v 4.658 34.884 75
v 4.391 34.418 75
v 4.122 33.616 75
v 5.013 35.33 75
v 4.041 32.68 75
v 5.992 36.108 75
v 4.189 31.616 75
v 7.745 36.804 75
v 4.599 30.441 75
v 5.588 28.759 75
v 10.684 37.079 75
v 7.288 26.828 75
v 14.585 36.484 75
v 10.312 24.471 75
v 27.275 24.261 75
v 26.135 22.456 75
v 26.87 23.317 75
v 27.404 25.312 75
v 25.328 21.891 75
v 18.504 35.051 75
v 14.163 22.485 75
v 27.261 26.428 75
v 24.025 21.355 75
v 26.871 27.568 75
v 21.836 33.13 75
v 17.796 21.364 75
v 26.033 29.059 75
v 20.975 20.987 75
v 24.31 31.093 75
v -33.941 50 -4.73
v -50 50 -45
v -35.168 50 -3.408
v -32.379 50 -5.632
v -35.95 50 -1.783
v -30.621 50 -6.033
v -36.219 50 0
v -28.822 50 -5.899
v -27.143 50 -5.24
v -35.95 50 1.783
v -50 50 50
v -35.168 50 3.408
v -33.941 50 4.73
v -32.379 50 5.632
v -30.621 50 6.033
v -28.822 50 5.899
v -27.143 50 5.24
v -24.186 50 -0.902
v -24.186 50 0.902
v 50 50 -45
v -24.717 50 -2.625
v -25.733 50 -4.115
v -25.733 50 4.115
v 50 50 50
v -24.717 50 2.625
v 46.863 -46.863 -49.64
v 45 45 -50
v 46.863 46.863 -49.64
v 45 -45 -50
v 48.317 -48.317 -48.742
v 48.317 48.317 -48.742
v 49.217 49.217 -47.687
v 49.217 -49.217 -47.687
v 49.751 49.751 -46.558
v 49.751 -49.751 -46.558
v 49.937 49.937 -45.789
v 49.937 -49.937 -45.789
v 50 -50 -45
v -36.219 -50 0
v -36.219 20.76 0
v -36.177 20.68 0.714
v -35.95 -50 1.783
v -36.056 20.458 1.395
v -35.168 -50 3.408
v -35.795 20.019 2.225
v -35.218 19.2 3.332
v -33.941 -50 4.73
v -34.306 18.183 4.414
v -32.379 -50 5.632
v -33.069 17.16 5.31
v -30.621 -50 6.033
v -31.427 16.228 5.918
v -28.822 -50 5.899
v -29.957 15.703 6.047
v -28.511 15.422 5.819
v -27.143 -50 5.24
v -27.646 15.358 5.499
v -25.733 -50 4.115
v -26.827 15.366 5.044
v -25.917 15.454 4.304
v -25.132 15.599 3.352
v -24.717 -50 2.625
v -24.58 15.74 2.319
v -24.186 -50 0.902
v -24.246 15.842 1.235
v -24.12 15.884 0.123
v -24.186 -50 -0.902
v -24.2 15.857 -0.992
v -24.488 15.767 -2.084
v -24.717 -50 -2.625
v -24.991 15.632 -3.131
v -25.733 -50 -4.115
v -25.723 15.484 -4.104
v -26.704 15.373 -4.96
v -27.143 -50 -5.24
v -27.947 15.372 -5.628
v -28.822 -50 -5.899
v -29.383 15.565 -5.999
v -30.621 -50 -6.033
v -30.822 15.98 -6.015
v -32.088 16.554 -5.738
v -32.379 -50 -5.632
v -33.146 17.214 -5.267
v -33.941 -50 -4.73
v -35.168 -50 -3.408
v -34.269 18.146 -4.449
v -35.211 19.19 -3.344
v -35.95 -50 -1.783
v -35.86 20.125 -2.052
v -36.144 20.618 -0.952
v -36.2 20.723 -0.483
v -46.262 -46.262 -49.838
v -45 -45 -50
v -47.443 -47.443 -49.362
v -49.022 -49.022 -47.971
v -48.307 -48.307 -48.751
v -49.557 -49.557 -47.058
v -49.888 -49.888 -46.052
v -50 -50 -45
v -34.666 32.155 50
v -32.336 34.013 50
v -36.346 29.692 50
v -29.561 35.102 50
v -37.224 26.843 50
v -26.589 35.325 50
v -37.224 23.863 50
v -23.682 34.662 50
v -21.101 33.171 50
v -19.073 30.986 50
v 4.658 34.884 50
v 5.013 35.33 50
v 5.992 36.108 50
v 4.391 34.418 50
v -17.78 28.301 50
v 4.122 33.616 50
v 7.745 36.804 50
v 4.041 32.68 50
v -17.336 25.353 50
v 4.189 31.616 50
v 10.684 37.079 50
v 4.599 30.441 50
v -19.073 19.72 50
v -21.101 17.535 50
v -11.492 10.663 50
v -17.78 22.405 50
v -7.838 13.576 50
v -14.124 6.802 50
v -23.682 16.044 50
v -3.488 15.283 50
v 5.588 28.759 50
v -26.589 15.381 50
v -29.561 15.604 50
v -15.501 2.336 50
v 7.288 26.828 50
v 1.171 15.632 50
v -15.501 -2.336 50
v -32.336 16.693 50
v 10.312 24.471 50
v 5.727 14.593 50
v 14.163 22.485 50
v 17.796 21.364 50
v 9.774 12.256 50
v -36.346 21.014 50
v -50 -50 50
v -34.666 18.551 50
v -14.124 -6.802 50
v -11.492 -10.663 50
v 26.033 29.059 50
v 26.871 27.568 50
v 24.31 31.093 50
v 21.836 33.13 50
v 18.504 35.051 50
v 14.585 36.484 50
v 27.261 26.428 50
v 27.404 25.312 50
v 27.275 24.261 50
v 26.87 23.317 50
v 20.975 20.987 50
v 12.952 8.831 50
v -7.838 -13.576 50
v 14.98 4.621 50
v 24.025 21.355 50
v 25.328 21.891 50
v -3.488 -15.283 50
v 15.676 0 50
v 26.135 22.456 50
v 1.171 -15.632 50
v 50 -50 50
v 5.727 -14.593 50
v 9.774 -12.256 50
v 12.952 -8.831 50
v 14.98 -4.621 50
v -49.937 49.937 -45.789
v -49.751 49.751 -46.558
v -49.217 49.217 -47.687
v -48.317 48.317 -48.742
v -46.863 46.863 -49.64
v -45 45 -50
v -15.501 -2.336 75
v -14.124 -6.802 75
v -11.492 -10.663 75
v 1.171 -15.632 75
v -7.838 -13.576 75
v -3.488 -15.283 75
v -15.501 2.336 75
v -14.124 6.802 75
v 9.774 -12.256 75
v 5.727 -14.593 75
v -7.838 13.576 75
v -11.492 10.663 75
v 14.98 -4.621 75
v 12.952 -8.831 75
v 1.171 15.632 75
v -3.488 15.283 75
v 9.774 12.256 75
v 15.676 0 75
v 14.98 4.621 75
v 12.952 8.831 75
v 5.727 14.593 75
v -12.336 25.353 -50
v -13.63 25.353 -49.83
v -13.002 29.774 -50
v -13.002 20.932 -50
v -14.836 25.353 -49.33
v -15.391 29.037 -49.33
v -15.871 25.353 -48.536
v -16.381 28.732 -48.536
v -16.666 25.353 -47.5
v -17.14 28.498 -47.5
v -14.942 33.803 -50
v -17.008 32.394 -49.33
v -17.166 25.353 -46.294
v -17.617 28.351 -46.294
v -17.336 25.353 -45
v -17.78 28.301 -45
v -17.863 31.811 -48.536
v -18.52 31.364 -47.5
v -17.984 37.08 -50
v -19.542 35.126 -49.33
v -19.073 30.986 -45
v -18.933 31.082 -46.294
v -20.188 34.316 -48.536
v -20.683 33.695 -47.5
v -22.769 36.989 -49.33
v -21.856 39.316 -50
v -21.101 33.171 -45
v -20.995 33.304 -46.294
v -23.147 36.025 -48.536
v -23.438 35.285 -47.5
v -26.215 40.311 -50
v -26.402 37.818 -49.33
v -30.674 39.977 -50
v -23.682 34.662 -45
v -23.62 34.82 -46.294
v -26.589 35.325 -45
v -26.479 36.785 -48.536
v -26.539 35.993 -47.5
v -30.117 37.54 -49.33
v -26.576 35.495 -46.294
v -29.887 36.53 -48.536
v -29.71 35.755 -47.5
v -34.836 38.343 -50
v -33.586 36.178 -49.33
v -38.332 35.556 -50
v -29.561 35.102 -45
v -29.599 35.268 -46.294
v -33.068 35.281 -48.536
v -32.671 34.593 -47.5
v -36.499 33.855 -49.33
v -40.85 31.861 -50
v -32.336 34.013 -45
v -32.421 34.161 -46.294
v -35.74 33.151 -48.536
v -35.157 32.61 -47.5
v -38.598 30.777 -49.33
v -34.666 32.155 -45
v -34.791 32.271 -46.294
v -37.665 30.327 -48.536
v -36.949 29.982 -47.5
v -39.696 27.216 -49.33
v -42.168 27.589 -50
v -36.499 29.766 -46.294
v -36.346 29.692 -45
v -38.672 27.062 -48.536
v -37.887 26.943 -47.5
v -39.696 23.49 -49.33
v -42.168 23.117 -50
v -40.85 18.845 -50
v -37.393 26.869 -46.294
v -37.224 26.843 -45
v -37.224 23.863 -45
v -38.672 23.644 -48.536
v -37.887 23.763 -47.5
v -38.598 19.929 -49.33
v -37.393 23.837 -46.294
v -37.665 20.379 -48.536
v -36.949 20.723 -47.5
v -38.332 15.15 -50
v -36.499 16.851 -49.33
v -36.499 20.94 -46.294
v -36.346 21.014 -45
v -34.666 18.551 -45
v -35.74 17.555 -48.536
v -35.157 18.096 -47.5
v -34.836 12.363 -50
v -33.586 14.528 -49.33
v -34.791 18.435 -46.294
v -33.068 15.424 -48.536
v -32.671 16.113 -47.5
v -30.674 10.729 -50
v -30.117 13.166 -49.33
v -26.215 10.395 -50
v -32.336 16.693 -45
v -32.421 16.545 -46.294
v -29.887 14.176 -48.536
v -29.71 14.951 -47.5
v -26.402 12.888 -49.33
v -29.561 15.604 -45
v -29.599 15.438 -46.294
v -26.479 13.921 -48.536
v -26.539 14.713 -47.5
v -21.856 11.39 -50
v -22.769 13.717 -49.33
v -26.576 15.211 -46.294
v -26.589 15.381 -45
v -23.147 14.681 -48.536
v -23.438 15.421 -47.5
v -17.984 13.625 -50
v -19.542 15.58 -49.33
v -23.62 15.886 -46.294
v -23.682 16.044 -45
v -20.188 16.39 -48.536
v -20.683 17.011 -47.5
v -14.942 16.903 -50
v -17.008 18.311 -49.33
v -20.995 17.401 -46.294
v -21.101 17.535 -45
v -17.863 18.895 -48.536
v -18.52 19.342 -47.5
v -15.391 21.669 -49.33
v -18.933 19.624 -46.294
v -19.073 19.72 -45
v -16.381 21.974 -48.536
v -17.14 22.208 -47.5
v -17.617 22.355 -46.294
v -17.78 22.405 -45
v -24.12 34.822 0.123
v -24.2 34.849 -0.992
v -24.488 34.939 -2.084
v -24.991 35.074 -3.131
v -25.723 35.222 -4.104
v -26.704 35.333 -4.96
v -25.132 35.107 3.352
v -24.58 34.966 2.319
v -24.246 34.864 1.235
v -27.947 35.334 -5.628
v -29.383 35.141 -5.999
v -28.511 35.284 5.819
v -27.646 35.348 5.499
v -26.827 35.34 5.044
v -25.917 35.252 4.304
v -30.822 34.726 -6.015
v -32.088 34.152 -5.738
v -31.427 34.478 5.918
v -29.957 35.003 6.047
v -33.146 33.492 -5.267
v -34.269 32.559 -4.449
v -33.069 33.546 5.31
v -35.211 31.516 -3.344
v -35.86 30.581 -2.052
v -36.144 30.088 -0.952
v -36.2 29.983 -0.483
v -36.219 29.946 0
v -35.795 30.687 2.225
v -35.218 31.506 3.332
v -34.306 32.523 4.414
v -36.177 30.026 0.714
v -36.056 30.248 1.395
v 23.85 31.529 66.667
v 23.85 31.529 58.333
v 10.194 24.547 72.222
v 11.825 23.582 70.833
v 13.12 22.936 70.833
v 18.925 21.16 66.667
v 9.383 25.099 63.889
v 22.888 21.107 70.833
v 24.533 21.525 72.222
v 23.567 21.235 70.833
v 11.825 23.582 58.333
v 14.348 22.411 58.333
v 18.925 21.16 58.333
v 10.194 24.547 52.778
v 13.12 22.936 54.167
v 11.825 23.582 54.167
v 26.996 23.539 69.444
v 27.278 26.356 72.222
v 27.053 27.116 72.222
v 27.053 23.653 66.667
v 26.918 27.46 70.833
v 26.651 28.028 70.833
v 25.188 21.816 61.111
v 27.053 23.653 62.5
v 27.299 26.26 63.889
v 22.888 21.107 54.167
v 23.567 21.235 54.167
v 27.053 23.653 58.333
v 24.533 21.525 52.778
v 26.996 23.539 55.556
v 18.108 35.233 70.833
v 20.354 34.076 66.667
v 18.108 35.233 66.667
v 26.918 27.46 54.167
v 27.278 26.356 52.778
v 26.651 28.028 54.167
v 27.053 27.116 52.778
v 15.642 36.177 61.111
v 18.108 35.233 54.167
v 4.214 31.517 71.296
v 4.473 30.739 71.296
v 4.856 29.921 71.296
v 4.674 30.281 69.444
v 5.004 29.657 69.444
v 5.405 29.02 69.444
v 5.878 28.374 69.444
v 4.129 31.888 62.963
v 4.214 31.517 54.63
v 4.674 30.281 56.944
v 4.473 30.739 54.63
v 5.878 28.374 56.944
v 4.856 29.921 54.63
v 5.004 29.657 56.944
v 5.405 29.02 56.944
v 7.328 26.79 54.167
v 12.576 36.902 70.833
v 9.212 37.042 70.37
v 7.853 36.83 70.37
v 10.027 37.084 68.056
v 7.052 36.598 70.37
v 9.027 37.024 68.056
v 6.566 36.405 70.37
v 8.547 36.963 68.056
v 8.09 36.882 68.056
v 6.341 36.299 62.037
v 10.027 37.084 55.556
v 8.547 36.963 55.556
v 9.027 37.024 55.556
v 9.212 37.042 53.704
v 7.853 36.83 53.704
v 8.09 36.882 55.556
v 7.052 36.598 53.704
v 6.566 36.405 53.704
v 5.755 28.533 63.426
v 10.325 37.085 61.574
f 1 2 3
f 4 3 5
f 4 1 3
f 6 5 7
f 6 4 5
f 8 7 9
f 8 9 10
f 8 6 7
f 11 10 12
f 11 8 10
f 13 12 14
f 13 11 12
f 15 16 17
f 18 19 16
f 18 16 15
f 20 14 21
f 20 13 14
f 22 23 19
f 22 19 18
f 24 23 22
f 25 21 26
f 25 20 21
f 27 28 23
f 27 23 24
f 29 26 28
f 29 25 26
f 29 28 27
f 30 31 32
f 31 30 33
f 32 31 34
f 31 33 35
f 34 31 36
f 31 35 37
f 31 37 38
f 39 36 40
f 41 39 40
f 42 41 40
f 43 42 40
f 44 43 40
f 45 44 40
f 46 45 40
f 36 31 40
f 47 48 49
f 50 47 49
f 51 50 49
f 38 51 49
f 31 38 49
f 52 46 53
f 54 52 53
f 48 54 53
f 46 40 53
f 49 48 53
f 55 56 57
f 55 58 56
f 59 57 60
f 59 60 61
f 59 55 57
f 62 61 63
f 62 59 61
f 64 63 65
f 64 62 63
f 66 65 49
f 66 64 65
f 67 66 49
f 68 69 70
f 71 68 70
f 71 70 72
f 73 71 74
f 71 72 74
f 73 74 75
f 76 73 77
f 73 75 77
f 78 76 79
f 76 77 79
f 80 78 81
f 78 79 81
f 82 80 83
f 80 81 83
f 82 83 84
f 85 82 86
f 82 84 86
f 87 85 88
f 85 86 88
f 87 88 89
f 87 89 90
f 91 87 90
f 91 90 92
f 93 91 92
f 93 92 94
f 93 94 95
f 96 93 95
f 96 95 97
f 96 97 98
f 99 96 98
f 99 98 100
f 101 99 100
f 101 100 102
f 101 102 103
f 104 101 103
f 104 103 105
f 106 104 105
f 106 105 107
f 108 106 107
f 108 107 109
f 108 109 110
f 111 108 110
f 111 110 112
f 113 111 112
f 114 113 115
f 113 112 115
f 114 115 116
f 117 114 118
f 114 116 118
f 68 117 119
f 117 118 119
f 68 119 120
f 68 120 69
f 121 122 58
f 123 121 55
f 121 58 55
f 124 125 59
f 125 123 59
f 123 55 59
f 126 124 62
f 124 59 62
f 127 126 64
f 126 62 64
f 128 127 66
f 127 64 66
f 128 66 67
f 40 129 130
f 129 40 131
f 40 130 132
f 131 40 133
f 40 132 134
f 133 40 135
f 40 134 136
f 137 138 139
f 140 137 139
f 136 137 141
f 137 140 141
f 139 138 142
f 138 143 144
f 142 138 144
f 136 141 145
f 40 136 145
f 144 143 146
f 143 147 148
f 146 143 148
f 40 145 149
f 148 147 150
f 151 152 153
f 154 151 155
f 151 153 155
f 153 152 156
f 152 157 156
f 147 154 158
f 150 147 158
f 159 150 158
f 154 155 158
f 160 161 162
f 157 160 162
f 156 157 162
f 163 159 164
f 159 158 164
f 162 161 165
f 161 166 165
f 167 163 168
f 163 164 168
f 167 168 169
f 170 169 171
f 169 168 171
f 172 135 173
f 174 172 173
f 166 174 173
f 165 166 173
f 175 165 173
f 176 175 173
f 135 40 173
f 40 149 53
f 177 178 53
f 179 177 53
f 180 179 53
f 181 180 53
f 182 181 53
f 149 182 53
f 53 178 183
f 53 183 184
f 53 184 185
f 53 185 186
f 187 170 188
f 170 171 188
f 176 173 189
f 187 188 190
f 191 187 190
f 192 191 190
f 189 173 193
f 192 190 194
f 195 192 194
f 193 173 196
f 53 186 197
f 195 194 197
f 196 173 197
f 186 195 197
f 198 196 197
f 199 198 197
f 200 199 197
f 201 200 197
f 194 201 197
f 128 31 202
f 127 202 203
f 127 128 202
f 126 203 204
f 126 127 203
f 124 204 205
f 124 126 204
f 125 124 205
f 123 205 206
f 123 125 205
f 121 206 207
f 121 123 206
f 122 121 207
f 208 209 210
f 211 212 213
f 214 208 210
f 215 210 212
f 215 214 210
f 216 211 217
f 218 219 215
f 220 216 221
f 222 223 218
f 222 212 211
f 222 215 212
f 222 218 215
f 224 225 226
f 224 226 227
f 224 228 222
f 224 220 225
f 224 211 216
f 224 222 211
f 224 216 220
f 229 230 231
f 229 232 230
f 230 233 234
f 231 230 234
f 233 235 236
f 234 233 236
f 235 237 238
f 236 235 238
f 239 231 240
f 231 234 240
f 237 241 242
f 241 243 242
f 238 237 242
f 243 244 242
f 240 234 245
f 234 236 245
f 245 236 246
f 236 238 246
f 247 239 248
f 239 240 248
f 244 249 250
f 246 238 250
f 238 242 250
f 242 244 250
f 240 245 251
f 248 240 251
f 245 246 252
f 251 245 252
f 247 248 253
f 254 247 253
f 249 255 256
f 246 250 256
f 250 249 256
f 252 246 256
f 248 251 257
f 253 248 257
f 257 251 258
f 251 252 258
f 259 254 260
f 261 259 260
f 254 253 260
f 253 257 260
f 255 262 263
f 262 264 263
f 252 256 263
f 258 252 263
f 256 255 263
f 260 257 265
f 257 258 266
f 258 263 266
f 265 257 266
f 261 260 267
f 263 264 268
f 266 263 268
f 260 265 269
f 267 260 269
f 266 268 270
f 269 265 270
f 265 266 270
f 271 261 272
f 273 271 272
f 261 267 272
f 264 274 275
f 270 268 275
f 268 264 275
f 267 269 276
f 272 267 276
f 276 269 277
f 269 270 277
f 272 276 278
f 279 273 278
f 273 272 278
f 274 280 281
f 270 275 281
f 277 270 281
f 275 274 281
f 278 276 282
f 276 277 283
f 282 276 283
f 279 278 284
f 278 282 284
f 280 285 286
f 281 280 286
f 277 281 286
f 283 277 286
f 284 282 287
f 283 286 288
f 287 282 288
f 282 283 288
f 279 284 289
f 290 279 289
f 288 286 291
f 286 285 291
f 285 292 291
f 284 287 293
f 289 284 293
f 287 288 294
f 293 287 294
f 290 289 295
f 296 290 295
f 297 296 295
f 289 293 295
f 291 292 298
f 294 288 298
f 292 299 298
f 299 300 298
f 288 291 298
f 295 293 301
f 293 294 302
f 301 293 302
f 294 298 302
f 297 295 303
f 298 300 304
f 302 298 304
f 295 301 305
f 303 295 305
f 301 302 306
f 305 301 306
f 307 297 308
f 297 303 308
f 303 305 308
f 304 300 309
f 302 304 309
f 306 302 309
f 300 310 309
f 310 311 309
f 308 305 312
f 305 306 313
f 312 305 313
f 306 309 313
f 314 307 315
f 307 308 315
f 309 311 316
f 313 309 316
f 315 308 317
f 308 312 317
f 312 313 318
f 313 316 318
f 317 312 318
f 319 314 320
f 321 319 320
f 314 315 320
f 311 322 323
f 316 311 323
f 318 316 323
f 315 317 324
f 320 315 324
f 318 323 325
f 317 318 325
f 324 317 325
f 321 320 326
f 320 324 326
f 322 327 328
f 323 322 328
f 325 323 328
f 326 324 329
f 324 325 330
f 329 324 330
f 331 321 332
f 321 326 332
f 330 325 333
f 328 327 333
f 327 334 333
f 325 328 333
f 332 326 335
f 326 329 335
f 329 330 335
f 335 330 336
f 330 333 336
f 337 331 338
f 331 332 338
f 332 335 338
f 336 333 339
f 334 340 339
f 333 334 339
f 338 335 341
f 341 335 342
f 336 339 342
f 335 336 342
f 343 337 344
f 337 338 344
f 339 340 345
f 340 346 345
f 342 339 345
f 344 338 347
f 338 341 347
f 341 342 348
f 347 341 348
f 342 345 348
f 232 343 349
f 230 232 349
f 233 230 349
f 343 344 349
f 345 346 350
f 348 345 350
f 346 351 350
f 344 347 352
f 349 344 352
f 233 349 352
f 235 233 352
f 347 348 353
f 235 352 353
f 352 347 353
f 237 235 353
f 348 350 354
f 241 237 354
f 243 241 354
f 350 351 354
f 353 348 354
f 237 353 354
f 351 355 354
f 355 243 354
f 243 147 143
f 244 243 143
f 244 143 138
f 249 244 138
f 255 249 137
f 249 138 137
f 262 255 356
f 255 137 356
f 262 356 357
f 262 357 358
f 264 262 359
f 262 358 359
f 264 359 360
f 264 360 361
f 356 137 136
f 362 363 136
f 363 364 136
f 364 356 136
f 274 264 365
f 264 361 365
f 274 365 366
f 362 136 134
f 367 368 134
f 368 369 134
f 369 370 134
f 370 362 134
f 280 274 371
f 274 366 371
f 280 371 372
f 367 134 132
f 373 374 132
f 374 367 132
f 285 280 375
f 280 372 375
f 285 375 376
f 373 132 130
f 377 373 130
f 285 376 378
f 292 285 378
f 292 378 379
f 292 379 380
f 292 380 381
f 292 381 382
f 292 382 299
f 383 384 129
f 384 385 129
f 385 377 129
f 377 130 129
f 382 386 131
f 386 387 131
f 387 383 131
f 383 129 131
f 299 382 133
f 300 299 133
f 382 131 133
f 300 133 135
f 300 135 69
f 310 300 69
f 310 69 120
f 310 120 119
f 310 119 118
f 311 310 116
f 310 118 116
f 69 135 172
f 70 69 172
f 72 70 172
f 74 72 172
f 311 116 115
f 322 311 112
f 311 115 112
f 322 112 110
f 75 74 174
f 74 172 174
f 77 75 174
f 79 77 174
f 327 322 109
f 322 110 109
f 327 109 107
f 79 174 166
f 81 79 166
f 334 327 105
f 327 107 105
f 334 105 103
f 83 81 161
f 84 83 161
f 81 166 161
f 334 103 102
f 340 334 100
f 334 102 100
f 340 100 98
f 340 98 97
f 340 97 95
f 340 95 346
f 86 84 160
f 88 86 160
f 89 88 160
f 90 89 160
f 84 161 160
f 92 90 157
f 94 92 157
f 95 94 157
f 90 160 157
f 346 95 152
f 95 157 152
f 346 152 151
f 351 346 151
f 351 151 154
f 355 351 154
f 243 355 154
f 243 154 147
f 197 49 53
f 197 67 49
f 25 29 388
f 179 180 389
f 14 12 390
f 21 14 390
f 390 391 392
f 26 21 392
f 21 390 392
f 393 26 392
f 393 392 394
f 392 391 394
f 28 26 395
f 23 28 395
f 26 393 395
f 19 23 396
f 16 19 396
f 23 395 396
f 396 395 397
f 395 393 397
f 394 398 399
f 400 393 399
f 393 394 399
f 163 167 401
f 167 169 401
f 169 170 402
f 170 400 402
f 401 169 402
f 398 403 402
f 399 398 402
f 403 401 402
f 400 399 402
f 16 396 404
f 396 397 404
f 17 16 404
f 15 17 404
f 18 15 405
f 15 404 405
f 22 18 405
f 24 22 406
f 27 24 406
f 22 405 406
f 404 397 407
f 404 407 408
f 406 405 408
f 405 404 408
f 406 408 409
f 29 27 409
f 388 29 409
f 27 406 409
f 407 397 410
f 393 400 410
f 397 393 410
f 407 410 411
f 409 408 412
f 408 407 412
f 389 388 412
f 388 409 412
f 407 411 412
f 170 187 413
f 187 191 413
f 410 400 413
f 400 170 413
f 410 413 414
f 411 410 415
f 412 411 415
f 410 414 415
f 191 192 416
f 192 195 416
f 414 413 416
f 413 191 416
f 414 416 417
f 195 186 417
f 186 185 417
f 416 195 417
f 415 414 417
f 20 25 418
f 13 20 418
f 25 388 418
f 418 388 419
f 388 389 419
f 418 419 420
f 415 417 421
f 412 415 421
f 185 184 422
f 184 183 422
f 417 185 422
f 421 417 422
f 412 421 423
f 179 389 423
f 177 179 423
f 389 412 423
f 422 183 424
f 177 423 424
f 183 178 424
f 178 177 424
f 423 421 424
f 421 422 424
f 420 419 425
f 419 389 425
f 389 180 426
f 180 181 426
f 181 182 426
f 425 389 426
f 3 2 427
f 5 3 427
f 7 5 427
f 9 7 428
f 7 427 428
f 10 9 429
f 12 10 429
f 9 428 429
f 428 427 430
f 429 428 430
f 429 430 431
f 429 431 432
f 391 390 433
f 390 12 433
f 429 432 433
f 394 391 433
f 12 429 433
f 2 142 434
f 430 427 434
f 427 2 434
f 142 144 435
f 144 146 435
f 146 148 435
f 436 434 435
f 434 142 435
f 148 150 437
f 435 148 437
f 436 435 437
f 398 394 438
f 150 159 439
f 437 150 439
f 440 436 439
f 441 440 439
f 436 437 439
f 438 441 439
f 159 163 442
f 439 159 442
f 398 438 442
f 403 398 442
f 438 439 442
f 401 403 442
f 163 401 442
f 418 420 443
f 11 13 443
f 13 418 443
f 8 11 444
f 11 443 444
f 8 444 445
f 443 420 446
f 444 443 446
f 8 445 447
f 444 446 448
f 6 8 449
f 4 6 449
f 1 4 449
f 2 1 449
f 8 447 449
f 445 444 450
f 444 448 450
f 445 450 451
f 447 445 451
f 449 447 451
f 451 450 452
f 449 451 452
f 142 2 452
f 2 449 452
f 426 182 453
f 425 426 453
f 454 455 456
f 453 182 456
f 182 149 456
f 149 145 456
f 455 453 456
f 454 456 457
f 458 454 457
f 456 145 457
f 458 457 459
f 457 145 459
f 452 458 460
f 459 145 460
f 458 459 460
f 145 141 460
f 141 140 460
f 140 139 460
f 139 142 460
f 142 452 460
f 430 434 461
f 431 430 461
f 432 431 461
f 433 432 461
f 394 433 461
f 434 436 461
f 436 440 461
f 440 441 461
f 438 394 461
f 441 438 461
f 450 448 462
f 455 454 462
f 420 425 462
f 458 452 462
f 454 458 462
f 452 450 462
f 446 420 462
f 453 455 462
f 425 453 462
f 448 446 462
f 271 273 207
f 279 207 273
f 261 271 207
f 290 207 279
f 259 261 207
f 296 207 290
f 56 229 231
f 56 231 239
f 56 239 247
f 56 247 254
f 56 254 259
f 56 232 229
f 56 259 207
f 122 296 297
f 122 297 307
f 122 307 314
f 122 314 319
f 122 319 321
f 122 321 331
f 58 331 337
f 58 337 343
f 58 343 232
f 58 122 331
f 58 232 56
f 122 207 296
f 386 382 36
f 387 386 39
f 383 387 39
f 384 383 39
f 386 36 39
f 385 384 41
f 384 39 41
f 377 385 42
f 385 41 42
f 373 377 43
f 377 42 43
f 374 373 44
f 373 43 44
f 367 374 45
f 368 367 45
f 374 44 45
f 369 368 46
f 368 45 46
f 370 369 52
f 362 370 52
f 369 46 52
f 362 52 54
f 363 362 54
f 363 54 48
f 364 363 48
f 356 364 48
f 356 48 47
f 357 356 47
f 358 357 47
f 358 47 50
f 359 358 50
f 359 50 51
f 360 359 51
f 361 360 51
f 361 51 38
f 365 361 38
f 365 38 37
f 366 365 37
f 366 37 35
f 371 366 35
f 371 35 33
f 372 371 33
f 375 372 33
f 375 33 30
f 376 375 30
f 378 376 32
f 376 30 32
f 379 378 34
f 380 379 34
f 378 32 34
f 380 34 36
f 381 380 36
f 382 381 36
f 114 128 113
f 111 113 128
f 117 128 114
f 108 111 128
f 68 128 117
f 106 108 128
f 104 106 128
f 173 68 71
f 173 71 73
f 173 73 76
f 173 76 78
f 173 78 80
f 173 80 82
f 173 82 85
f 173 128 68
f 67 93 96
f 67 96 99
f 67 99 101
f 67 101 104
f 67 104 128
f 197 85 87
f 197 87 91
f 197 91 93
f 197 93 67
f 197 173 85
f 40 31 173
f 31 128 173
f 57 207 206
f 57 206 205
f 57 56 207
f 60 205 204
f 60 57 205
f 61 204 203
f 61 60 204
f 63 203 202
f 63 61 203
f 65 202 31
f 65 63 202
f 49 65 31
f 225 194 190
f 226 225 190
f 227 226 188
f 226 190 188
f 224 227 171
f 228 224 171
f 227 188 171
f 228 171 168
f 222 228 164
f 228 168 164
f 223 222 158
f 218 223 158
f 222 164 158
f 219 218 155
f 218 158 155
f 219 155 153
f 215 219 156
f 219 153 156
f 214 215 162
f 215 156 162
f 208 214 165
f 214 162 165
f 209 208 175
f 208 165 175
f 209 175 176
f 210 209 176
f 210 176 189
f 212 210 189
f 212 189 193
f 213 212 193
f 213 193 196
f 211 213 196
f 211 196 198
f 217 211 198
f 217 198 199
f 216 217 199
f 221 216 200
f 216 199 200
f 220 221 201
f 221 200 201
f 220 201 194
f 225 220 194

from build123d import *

# Parameters (mm, degrees)
F0_W      = 100
F0_H      = 100
F1_DEPTH  = 50
F2_R      = 10
F3_DEPTH  = 105
F4_R      = 6.050318
F5_DEPTH  = 105
F6_R      = 5
F7_R      = 15.676311
F8_DEPTH  = 25
F10_DEPTH = 25


with BuildPart() as f1:
    # F0 (on Front) → F1 (new body, symmetric)
    with BuildSketch(Plane.XZ):
        Rectangle(F0_W, F0_H)
    extrude(amount=F1_DEPTH, both=True)

    # F2 (on face) → F3 (cut)
    with BuildSketch(Plane.XY.offset(50)):
        with Locations((-27.335882, 25.35297)):
            Circle(F2_R)
    extrude(amount=-F3_DEPTH, mode=Mode.SUBTRACT)

    # F4 (on face) → F5 (cut)
    with BuildSketch(Plane(origin=(0, 50, 0), x_dir=(-1, 0, 0), z_dir=(0, 1, 0))):
        with Locations((30.168613, 0)):
            Circle(F4_R)
    extrude(amount=-F5_DEPTH, mode=Mode.SUBTRACT)

    # F6
    f6_edges = [f1.edges().sort_by_distance(p)[0] for p in [
        (0, 50, -50),
        (-50, 0, -50),
        (50, 0, -50),
        (0, -50, -50),
        (-37.335882, 25.35297, -50),
    ]]
    fillet(f6_edges, radius=F6_R)

    # F7 (on face) → F8 (join)
    with BuildSketch(Plane.XY.offset(50)):
        Circle(F7_R)
    extrude(amount=F8_DEPTH)

    # F9 (on face) → F10 (join)
    with BuildSketch(Plane.XY.offset(50)):
        with BuildLine():
            add(Edge.make_bspline(
                [(4.390738, 34.417719), (-0.534371, 24.049071), (18.924589, 21.160099), (38.383548, 18.271128), (23.849698, 31.528747), (9.315848, 44.786366), (4.390738, 34.417719)],
                knots=[0, 0, 0, 2.094395, 2.094395, 4.18879, 4.18879, 6.283185, 6.283185, 6.283185], degree=2, weights=[1, 0.5, 1, 0.5, 1, 0.5, 1]))
        make_face()
    extrude(amount=F10_DEPTH)


solid = f1.part
